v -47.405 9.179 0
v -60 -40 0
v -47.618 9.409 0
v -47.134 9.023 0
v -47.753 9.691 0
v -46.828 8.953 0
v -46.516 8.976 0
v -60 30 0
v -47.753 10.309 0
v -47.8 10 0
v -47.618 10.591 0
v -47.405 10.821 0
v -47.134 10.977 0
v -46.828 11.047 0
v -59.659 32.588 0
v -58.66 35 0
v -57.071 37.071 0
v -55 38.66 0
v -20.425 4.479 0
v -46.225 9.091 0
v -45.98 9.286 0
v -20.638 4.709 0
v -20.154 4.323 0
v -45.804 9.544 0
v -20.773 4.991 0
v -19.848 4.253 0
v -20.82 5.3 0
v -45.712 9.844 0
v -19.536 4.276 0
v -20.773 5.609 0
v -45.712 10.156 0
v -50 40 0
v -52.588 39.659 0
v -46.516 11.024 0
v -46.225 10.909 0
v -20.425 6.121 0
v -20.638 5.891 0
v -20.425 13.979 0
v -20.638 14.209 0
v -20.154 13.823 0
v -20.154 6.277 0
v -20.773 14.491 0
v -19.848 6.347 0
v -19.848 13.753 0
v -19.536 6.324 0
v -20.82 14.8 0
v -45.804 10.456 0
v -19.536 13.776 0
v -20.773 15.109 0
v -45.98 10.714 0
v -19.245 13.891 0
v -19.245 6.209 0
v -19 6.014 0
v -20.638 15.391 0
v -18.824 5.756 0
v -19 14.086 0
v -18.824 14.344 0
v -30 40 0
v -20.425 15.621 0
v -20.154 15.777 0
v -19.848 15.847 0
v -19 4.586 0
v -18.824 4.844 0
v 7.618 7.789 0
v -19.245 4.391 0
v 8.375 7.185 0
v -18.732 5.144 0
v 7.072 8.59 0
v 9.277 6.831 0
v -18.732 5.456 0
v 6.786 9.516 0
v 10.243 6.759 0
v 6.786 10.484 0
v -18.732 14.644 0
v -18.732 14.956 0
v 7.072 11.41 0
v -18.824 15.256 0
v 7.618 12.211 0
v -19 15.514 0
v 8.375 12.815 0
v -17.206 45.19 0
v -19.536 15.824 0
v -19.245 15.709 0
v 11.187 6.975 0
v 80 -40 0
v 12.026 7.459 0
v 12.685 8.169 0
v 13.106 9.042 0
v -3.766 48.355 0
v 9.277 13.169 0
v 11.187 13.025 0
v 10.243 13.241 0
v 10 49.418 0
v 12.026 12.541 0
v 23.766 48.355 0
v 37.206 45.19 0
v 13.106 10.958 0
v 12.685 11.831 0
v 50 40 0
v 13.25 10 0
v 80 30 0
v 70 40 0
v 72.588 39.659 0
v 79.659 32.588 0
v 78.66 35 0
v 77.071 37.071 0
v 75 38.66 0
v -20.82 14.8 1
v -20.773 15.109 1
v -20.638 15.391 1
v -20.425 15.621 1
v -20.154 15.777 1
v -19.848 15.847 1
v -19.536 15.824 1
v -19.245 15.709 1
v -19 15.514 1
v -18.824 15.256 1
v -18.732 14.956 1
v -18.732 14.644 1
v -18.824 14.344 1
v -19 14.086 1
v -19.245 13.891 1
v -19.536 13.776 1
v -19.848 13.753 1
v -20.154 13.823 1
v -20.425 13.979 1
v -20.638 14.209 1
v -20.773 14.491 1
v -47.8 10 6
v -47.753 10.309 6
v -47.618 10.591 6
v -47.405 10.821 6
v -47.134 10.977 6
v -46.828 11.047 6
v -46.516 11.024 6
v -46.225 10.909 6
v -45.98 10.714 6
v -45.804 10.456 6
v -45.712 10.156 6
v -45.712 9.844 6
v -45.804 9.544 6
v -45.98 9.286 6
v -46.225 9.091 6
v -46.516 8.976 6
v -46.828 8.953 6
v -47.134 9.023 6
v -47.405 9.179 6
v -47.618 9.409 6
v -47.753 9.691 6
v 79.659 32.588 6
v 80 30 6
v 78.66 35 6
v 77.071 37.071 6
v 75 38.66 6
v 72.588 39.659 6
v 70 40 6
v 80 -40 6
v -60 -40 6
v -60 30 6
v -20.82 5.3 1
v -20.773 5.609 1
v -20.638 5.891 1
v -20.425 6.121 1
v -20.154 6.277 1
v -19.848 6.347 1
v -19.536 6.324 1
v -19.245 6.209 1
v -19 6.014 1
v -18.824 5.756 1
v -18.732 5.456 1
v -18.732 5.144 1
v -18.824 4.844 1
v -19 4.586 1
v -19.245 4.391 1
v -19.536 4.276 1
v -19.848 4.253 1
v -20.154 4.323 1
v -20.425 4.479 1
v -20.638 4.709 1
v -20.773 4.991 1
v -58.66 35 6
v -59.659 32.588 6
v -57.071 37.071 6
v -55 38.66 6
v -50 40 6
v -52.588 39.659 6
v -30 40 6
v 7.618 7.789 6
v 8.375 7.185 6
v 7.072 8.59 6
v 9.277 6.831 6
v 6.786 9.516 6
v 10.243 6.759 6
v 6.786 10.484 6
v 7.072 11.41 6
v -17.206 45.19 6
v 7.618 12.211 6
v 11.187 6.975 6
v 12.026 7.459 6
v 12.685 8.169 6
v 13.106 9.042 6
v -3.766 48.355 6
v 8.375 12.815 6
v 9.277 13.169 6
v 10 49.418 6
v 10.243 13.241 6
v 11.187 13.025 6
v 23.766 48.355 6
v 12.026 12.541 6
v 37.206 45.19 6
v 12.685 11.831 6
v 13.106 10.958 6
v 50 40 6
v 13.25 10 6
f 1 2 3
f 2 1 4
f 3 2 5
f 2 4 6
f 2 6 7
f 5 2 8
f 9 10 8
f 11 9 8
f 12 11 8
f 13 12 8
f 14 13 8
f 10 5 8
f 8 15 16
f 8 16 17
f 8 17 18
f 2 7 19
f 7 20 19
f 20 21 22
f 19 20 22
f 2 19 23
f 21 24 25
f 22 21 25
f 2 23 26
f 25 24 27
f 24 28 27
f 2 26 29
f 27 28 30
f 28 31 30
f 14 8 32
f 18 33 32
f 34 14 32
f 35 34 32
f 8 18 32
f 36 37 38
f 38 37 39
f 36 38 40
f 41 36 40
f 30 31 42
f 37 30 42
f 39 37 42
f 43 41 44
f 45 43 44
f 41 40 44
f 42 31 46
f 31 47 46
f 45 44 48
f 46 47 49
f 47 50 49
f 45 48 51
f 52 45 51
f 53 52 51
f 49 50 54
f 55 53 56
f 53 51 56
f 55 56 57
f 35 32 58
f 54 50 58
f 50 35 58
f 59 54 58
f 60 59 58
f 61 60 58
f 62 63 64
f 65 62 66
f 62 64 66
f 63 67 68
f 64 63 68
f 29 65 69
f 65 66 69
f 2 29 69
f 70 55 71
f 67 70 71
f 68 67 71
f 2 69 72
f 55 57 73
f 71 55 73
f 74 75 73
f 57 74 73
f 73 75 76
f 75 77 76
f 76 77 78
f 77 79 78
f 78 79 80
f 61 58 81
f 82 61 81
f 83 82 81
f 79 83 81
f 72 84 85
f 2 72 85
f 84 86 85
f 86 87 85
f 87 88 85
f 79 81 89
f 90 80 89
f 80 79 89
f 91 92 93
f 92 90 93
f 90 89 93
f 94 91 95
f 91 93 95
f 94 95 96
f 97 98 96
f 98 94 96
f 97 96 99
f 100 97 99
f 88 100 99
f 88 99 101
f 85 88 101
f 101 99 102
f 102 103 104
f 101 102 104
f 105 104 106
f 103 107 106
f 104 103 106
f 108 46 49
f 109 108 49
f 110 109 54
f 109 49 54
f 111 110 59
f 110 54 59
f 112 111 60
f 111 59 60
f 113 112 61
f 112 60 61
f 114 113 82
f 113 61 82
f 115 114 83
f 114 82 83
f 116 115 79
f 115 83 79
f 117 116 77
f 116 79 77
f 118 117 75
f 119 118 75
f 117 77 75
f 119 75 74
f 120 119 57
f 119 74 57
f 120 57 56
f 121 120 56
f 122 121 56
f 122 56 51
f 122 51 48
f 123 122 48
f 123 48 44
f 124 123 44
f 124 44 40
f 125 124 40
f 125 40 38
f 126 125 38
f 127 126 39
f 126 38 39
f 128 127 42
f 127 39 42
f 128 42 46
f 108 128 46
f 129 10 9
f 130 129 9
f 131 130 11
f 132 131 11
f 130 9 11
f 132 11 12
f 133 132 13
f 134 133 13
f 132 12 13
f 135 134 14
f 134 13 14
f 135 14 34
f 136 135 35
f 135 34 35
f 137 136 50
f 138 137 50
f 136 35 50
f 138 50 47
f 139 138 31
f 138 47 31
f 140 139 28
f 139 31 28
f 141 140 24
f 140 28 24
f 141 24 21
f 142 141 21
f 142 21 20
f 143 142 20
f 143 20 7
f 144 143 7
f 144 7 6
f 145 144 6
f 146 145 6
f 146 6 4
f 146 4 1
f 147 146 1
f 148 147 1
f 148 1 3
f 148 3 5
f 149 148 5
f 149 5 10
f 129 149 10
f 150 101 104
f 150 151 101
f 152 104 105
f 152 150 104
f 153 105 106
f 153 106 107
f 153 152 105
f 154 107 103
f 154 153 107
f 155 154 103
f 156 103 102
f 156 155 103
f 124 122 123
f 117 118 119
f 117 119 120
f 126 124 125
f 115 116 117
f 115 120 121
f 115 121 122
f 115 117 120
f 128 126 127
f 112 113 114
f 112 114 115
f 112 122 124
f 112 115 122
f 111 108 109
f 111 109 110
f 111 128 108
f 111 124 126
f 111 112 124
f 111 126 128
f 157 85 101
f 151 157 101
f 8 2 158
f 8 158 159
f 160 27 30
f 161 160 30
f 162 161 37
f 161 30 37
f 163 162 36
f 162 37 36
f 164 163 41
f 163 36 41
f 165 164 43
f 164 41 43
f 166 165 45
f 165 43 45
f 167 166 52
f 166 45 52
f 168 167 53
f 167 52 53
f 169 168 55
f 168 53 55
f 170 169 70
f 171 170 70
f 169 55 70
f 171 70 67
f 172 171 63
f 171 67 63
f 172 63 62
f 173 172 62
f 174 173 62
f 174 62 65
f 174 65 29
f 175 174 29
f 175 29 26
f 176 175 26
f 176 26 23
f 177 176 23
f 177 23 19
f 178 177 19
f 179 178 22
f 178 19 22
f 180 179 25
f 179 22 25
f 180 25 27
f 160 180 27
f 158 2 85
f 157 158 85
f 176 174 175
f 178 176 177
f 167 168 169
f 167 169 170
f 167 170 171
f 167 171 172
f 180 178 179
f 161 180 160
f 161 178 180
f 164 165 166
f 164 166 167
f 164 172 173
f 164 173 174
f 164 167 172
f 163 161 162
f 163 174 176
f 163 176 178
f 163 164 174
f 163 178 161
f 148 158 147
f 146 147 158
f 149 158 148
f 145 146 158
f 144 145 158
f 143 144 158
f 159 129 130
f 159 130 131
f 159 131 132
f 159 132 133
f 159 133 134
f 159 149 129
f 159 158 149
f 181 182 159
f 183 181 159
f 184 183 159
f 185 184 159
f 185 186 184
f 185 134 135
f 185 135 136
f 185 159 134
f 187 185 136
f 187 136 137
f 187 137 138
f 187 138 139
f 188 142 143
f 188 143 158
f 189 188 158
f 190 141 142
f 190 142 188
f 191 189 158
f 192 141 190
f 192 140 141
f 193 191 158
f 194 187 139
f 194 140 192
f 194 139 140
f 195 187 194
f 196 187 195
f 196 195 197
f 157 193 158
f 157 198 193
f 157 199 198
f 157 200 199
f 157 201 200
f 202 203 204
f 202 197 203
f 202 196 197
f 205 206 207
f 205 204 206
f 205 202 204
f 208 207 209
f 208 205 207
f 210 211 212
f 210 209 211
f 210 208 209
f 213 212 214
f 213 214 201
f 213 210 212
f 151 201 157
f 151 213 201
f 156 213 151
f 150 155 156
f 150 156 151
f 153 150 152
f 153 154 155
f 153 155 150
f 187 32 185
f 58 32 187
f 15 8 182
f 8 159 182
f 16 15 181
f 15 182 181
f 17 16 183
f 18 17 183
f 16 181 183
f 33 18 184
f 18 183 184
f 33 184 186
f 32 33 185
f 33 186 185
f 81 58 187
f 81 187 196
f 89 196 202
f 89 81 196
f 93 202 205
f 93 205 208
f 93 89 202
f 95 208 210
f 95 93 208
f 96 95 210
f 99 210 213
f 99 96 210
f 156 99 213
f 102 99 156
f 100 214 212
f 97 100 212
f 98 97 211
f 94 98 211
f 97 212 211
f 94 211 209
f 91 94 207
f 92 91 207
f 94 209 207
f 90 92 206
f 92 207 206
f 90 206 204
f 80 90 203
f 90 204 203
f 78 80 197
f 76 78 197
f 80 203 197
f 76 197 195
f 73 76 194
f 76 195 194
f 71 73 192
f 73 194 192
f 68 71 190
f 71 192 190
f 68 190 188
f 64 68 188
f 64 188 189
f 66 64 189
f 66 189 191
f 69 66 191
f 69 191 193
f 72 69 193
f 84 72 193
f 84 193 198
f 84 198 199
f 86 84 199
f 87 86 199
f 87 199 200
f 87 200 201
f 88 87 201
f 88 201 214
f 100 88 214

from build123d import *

# Parameters (mm, degrees)
ESQUISSE1_W             = 140
ESQUISSE1_H             = 80
EXTRUSION1_DEPTH        = 6
CONG_1_R                = 10
ESQUISSE2_R             = 3.25
ENL_V_MAT_EXTRU_1_DEPTH = 90.643739324
ESQUISSE5_R             = 1.05
ENL_V_MAT_EXTRU_2_DEPTH = 1
EXTRUSION2_DEPTH        = 6
ESQUISSE7_R             = 1.05
ENL_V_MAT_EXTRU_3_DEPTH = 95.223768892


with BuildPart() as part:
    # Esquisse1 → Extrusion1 (new body)
    with BuildSketch(Plane.XY):
        with Locations((10, 0)):
            Rectangle(ESQUISSE1_W, ESQUISSE1_H)
    extrude(amount=EXTRUSION1_DEPTH)

    # Congé1
    cong_1_edges = [part.edges().sort_by_distance(p)[0] for p in [
        (-60, 40, 3),
        (80, 40, 3),
    ]]
    fillet(cong_1_edges, radius=CONG_1_R)

    # Esquisse2 → Enlèv. mat.-Extru.1 (cut, through all)
    with BuildSketch(Plane.XY.offset(6)):
        with Locations((10, 10)):
            Circle(ESQUISSE2_R)
    extrude(amount=-ENL_V_MAT_EXTRU_1_DEPTH, mode=Mode.SUBTRACT)

    # Esquisse5 → Enlèv. mat.-Extru.2 (cut)
    with BuildSketch(Plane(origin=(0, 0, 0), x_dir=(-1, 0, 0), z_dir=(0, 0, -1))):
        with Locations((19.77, 14.8)):
            Circle(ESQUISSE5_R)
        with Locations((19.77, 5.3)):
            Circle(ESQUISSE5_R)
    extrude(amount=-ENL_V_MAT_EXTRU_2_DEPTH, mode=Mode.SUBTRACT)

    # Esquisse6 → Extrusion2 (add)
    with BuildSketch(Plane(origin=(0, 0, 0), x_dir=(-1, 0, 0), z_dir=(0, 0, -1))):
        with BuildLine():
            Line((-50, 40), (30, 40))
            ThreePointArc((30, 40), (-10, 49.417796635), (-50, 40))
        make_face()
    extrude(amount=-EXTRUSION2_DEPTH)

    # Esquisse7 → Enlèv. mat.-Extru.3 (cut, through all)
    with BuildSketch(Plane(origin=(0, 0, 0), x_dir=(-1, 0, 0), z_dir=(0, 0, -1))):
        with Locations((46.75, 10)):
            Circle(ESQUISSE7_R)
    extrude(amount=-ENL_V_MAT_EXTRU_3_DEPTH, mode=Mode.SUBTRACT)


solid = part.part
